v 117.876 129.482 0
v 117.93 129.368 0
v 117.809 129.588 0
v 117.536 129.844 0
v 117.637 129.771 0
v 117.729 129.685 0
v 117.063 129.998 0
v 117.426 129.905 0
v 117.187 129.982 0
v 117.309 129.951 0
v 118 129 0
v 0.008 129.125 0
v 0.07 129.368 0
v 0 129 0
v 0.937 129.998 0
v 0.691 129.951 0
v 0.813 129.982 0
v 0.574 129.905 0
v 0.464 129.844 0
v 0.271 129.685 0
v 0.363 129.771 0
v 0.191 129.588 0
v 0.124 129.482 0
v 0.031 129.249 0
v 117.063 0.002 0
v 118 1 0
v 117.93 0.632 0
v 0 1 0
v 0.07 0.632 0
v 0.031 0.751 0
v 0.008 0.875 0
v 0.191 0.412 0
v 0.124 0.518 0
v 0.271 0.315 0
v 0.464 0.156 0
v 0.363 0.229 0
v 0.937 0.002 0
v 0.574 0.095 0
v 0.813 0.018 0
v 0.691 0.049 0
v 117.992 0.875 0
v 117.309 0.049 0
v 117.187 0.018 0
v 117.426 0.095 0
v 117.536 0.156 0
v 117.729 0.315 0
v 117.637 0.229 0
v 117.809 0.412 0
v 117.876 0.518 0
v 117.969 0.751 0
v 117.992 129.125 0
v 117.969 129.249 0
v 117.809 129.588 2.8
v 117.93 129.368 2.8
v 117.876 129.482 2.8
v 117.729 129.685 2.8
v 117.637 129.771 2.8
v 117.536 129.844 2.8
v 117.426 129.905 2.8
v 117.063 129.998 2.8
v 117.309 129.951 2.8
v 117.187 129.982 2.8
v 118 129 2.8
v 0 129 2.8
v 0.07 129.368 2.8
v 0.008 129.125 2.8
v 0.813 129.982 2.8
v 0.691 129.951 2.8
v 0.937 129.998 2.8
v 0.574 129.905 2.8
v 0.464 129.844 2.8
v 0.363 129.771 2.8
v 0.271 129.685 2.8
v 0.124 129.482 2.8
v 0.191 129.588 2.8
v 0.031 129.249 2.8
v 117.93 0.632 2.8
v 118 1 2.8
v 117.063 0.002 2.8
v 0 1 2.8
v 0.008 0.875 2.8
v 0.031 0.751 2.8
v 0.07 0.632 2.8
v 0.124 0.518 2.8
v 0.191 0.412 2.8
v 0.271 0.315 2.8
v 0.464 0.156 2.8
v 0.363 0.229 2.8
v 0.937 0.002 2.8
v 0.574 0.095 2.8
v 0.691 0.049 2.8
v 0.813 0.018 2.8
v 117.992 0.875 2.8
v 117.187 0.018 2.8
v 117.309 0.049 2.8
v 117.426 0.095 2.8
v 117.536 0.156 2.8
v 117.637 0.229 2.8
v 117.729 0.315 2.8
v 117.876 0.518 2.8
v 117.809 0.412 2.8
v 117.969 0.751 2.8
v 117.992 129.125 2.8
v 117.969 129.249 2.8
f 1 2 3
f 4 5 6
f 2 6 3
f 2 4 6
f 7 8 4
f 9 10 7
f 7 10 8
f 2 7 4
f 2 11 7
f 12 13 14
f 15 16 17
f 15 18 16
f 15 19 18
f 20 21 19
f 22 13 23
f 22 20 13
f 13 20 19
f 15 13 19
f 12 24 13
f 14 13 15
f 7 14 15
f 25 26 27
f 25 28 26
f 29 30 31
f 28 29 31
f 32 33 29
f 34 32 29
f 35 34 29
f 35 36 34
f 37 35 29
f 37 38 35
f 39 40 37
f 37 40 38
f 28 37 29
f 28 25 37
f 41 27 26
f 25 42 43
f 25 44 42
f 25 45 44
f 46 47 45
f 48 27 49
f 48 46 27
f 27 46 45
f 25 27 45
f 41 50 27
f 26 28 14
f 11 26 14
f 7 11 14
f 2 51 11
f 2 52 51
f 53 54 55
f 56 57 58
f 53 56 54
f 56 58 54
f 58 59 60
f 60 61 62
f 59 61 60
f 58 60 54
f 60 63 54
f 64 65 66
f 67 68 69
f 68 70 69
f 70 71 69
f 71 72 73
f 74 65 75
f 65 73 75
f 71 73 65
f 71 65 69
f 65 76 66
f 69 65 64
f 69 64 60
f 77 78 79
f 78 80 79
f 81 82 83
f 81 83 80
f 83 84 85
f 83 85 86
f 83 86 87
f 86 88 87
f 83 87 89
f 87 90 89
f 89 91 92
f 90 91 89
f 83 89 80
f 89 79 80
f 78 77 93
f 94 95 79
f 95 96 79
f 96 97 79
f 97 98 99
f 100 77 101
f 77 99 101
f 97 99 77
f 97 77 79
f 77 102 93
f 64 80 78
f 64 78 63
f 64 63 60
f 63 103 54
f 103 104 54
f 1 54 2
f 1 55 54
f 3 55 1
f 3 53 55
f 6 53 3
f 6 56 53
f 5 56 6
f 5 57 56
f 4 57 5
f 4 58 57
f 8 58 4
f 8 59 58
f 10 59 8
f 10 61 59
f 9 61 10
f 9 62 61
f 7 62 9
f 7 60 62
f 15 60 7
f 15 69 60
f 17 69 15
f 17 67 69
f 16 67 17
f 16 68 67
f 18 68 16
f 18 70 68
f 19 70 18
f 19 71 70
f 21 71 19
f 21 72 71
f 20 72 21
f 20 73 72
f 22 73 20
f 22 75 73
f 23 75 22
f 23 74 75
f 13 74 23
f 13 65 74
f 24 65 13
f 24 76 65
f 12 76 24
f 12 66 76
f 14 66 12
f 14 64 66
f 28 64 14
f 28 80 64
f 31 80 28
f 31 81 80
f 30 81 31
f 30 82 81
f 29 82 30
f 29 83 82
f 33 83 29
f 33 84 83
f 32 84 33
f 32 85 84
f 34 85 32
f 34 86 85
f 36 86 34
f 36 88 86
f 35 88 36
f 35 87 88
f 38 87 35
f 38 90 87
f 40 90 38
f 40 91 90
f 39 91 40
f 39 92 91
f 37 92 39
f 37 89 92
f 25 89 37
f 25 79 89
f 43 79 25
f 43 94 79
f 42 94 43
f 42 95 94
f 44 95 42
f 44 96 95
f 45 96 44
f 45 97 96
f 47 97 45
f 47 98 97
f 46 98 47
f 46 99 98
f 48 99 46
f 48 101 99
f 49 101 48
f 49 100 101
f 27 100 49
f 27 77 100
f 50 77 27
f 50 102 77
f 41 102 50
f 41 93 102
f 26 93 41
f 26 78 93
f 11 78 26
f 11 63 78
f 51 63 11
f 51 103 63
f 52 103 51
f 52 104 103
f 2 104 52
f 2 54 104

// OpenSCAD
// file: ../../lib/primitive/rounded_square.scad
$bleed = 1;
$rounding = 3;

module rounded_square(size, flat_top=false, flat_bottom=false) {
  assert(!(flat_top && flat_bottom), "Flat top and flat bottom are exclusive");

  rounding_height = flat_top || flat_bottom 
    ? $rounding 
    : $rounding * 2;

  offset = flat_bottom ? 0 : $rounding;

  inner_size = [
    size[0] - $rounding * 2,
    size[1] - rounding_height,
  ];

  minkowski() {
    translate([$rounding, offset]) {
      square(inner_size);
    }
    if (flat_top ) {
      difference() {
        circle($rounding);
        translate([-$rounding, 0]) {
          square([$rounding * 2, $rounding]);
        }
      }
    } else if (flat_bottom) {
      difference() {
        circle($rounding);
        translate([-$rounding, -$rounding]) {
          square([$rounding * 2, $rounding]);
        }
      }
    } else {
      circle($rounding);
    }
  }
}
// file: ../../lib/primitive/rounded_cube.scad
include <./rounded_square.scad>

$bleed = 1;
$rounding = 3;

// Render a rounded cube
// flat_top: do not round the top edges
// flat_bottom: do not round the bottom edges
// flat: equals flat_top && flat_bottom
// 
// Limitations:
// requires height > $rounding * 2
// flat_top || flat_bottom requires height > $rounding
// flat_top && flat_bottom requires height > $bleed
module rounded_cube(
  size, 
  flat=false, 
  flat_top=false, 
  flat_bottom=false,
  side_rounding=-1
) {
  _flat = flat || (flat_top && flat_bottom);
  _flat_top = flat_top || flat;
  _flat_bottom = flat_bottom || flat;
  _rounding = min($rounding, size[2] / 2);
  _side_rounding = side_rounding > -1 ? side_rounding: $rounding;

  assert(_side_rounding >= $rounding, "side rounding cannot be less than rounding");

  top_height = _flat_top ? 0: _rounding;
  bottom_height = _flat_bottom ? 0: _rounding;

  cube_size = [
    size[0] - _rounding * 2,
    size[1] - _rounding * 2,
    size[2] - (top_height + bottom_height)
  ];

  if (_flat_top && _flat_bottom) {
     linear_extrude(cube_size[2]) {
       rounded_square([size[0], size[1]]);
     }
   } else {
     minkowski() {
       translate([_rounding, _rounding, bottom_height]) {
         if (_side_rounding != _rounding) {
           linear_extrude(cube_size[2]) {
             rounded_square([cube_size[0], cube_size[1]], $rounding=_side_rounding);
           }
         } else {
           cube(cube_size);
         }
       }

       if (_flat_top) {
         difference() {
           sphere(_rounding);
           cylinder(_rounding, _rounding, _rounding);
         }
       } else if (_flat_bottom) {
         difference() {
           sphere(_rounding);
           translate ([0, 0, -_rounding]) {
             cylinder(_rounding, _rounding, _rounding);
           }
         }
       } else {
         sphere(_rounding);
       }
    }
  }
}
// main file
include <../../lib/primitive/rounded_cube.scad>

$fn = 50;
$rounding = 1;

size = [
  118,
  130,
  2.8
];

rounded_cube(size, flat=true);
